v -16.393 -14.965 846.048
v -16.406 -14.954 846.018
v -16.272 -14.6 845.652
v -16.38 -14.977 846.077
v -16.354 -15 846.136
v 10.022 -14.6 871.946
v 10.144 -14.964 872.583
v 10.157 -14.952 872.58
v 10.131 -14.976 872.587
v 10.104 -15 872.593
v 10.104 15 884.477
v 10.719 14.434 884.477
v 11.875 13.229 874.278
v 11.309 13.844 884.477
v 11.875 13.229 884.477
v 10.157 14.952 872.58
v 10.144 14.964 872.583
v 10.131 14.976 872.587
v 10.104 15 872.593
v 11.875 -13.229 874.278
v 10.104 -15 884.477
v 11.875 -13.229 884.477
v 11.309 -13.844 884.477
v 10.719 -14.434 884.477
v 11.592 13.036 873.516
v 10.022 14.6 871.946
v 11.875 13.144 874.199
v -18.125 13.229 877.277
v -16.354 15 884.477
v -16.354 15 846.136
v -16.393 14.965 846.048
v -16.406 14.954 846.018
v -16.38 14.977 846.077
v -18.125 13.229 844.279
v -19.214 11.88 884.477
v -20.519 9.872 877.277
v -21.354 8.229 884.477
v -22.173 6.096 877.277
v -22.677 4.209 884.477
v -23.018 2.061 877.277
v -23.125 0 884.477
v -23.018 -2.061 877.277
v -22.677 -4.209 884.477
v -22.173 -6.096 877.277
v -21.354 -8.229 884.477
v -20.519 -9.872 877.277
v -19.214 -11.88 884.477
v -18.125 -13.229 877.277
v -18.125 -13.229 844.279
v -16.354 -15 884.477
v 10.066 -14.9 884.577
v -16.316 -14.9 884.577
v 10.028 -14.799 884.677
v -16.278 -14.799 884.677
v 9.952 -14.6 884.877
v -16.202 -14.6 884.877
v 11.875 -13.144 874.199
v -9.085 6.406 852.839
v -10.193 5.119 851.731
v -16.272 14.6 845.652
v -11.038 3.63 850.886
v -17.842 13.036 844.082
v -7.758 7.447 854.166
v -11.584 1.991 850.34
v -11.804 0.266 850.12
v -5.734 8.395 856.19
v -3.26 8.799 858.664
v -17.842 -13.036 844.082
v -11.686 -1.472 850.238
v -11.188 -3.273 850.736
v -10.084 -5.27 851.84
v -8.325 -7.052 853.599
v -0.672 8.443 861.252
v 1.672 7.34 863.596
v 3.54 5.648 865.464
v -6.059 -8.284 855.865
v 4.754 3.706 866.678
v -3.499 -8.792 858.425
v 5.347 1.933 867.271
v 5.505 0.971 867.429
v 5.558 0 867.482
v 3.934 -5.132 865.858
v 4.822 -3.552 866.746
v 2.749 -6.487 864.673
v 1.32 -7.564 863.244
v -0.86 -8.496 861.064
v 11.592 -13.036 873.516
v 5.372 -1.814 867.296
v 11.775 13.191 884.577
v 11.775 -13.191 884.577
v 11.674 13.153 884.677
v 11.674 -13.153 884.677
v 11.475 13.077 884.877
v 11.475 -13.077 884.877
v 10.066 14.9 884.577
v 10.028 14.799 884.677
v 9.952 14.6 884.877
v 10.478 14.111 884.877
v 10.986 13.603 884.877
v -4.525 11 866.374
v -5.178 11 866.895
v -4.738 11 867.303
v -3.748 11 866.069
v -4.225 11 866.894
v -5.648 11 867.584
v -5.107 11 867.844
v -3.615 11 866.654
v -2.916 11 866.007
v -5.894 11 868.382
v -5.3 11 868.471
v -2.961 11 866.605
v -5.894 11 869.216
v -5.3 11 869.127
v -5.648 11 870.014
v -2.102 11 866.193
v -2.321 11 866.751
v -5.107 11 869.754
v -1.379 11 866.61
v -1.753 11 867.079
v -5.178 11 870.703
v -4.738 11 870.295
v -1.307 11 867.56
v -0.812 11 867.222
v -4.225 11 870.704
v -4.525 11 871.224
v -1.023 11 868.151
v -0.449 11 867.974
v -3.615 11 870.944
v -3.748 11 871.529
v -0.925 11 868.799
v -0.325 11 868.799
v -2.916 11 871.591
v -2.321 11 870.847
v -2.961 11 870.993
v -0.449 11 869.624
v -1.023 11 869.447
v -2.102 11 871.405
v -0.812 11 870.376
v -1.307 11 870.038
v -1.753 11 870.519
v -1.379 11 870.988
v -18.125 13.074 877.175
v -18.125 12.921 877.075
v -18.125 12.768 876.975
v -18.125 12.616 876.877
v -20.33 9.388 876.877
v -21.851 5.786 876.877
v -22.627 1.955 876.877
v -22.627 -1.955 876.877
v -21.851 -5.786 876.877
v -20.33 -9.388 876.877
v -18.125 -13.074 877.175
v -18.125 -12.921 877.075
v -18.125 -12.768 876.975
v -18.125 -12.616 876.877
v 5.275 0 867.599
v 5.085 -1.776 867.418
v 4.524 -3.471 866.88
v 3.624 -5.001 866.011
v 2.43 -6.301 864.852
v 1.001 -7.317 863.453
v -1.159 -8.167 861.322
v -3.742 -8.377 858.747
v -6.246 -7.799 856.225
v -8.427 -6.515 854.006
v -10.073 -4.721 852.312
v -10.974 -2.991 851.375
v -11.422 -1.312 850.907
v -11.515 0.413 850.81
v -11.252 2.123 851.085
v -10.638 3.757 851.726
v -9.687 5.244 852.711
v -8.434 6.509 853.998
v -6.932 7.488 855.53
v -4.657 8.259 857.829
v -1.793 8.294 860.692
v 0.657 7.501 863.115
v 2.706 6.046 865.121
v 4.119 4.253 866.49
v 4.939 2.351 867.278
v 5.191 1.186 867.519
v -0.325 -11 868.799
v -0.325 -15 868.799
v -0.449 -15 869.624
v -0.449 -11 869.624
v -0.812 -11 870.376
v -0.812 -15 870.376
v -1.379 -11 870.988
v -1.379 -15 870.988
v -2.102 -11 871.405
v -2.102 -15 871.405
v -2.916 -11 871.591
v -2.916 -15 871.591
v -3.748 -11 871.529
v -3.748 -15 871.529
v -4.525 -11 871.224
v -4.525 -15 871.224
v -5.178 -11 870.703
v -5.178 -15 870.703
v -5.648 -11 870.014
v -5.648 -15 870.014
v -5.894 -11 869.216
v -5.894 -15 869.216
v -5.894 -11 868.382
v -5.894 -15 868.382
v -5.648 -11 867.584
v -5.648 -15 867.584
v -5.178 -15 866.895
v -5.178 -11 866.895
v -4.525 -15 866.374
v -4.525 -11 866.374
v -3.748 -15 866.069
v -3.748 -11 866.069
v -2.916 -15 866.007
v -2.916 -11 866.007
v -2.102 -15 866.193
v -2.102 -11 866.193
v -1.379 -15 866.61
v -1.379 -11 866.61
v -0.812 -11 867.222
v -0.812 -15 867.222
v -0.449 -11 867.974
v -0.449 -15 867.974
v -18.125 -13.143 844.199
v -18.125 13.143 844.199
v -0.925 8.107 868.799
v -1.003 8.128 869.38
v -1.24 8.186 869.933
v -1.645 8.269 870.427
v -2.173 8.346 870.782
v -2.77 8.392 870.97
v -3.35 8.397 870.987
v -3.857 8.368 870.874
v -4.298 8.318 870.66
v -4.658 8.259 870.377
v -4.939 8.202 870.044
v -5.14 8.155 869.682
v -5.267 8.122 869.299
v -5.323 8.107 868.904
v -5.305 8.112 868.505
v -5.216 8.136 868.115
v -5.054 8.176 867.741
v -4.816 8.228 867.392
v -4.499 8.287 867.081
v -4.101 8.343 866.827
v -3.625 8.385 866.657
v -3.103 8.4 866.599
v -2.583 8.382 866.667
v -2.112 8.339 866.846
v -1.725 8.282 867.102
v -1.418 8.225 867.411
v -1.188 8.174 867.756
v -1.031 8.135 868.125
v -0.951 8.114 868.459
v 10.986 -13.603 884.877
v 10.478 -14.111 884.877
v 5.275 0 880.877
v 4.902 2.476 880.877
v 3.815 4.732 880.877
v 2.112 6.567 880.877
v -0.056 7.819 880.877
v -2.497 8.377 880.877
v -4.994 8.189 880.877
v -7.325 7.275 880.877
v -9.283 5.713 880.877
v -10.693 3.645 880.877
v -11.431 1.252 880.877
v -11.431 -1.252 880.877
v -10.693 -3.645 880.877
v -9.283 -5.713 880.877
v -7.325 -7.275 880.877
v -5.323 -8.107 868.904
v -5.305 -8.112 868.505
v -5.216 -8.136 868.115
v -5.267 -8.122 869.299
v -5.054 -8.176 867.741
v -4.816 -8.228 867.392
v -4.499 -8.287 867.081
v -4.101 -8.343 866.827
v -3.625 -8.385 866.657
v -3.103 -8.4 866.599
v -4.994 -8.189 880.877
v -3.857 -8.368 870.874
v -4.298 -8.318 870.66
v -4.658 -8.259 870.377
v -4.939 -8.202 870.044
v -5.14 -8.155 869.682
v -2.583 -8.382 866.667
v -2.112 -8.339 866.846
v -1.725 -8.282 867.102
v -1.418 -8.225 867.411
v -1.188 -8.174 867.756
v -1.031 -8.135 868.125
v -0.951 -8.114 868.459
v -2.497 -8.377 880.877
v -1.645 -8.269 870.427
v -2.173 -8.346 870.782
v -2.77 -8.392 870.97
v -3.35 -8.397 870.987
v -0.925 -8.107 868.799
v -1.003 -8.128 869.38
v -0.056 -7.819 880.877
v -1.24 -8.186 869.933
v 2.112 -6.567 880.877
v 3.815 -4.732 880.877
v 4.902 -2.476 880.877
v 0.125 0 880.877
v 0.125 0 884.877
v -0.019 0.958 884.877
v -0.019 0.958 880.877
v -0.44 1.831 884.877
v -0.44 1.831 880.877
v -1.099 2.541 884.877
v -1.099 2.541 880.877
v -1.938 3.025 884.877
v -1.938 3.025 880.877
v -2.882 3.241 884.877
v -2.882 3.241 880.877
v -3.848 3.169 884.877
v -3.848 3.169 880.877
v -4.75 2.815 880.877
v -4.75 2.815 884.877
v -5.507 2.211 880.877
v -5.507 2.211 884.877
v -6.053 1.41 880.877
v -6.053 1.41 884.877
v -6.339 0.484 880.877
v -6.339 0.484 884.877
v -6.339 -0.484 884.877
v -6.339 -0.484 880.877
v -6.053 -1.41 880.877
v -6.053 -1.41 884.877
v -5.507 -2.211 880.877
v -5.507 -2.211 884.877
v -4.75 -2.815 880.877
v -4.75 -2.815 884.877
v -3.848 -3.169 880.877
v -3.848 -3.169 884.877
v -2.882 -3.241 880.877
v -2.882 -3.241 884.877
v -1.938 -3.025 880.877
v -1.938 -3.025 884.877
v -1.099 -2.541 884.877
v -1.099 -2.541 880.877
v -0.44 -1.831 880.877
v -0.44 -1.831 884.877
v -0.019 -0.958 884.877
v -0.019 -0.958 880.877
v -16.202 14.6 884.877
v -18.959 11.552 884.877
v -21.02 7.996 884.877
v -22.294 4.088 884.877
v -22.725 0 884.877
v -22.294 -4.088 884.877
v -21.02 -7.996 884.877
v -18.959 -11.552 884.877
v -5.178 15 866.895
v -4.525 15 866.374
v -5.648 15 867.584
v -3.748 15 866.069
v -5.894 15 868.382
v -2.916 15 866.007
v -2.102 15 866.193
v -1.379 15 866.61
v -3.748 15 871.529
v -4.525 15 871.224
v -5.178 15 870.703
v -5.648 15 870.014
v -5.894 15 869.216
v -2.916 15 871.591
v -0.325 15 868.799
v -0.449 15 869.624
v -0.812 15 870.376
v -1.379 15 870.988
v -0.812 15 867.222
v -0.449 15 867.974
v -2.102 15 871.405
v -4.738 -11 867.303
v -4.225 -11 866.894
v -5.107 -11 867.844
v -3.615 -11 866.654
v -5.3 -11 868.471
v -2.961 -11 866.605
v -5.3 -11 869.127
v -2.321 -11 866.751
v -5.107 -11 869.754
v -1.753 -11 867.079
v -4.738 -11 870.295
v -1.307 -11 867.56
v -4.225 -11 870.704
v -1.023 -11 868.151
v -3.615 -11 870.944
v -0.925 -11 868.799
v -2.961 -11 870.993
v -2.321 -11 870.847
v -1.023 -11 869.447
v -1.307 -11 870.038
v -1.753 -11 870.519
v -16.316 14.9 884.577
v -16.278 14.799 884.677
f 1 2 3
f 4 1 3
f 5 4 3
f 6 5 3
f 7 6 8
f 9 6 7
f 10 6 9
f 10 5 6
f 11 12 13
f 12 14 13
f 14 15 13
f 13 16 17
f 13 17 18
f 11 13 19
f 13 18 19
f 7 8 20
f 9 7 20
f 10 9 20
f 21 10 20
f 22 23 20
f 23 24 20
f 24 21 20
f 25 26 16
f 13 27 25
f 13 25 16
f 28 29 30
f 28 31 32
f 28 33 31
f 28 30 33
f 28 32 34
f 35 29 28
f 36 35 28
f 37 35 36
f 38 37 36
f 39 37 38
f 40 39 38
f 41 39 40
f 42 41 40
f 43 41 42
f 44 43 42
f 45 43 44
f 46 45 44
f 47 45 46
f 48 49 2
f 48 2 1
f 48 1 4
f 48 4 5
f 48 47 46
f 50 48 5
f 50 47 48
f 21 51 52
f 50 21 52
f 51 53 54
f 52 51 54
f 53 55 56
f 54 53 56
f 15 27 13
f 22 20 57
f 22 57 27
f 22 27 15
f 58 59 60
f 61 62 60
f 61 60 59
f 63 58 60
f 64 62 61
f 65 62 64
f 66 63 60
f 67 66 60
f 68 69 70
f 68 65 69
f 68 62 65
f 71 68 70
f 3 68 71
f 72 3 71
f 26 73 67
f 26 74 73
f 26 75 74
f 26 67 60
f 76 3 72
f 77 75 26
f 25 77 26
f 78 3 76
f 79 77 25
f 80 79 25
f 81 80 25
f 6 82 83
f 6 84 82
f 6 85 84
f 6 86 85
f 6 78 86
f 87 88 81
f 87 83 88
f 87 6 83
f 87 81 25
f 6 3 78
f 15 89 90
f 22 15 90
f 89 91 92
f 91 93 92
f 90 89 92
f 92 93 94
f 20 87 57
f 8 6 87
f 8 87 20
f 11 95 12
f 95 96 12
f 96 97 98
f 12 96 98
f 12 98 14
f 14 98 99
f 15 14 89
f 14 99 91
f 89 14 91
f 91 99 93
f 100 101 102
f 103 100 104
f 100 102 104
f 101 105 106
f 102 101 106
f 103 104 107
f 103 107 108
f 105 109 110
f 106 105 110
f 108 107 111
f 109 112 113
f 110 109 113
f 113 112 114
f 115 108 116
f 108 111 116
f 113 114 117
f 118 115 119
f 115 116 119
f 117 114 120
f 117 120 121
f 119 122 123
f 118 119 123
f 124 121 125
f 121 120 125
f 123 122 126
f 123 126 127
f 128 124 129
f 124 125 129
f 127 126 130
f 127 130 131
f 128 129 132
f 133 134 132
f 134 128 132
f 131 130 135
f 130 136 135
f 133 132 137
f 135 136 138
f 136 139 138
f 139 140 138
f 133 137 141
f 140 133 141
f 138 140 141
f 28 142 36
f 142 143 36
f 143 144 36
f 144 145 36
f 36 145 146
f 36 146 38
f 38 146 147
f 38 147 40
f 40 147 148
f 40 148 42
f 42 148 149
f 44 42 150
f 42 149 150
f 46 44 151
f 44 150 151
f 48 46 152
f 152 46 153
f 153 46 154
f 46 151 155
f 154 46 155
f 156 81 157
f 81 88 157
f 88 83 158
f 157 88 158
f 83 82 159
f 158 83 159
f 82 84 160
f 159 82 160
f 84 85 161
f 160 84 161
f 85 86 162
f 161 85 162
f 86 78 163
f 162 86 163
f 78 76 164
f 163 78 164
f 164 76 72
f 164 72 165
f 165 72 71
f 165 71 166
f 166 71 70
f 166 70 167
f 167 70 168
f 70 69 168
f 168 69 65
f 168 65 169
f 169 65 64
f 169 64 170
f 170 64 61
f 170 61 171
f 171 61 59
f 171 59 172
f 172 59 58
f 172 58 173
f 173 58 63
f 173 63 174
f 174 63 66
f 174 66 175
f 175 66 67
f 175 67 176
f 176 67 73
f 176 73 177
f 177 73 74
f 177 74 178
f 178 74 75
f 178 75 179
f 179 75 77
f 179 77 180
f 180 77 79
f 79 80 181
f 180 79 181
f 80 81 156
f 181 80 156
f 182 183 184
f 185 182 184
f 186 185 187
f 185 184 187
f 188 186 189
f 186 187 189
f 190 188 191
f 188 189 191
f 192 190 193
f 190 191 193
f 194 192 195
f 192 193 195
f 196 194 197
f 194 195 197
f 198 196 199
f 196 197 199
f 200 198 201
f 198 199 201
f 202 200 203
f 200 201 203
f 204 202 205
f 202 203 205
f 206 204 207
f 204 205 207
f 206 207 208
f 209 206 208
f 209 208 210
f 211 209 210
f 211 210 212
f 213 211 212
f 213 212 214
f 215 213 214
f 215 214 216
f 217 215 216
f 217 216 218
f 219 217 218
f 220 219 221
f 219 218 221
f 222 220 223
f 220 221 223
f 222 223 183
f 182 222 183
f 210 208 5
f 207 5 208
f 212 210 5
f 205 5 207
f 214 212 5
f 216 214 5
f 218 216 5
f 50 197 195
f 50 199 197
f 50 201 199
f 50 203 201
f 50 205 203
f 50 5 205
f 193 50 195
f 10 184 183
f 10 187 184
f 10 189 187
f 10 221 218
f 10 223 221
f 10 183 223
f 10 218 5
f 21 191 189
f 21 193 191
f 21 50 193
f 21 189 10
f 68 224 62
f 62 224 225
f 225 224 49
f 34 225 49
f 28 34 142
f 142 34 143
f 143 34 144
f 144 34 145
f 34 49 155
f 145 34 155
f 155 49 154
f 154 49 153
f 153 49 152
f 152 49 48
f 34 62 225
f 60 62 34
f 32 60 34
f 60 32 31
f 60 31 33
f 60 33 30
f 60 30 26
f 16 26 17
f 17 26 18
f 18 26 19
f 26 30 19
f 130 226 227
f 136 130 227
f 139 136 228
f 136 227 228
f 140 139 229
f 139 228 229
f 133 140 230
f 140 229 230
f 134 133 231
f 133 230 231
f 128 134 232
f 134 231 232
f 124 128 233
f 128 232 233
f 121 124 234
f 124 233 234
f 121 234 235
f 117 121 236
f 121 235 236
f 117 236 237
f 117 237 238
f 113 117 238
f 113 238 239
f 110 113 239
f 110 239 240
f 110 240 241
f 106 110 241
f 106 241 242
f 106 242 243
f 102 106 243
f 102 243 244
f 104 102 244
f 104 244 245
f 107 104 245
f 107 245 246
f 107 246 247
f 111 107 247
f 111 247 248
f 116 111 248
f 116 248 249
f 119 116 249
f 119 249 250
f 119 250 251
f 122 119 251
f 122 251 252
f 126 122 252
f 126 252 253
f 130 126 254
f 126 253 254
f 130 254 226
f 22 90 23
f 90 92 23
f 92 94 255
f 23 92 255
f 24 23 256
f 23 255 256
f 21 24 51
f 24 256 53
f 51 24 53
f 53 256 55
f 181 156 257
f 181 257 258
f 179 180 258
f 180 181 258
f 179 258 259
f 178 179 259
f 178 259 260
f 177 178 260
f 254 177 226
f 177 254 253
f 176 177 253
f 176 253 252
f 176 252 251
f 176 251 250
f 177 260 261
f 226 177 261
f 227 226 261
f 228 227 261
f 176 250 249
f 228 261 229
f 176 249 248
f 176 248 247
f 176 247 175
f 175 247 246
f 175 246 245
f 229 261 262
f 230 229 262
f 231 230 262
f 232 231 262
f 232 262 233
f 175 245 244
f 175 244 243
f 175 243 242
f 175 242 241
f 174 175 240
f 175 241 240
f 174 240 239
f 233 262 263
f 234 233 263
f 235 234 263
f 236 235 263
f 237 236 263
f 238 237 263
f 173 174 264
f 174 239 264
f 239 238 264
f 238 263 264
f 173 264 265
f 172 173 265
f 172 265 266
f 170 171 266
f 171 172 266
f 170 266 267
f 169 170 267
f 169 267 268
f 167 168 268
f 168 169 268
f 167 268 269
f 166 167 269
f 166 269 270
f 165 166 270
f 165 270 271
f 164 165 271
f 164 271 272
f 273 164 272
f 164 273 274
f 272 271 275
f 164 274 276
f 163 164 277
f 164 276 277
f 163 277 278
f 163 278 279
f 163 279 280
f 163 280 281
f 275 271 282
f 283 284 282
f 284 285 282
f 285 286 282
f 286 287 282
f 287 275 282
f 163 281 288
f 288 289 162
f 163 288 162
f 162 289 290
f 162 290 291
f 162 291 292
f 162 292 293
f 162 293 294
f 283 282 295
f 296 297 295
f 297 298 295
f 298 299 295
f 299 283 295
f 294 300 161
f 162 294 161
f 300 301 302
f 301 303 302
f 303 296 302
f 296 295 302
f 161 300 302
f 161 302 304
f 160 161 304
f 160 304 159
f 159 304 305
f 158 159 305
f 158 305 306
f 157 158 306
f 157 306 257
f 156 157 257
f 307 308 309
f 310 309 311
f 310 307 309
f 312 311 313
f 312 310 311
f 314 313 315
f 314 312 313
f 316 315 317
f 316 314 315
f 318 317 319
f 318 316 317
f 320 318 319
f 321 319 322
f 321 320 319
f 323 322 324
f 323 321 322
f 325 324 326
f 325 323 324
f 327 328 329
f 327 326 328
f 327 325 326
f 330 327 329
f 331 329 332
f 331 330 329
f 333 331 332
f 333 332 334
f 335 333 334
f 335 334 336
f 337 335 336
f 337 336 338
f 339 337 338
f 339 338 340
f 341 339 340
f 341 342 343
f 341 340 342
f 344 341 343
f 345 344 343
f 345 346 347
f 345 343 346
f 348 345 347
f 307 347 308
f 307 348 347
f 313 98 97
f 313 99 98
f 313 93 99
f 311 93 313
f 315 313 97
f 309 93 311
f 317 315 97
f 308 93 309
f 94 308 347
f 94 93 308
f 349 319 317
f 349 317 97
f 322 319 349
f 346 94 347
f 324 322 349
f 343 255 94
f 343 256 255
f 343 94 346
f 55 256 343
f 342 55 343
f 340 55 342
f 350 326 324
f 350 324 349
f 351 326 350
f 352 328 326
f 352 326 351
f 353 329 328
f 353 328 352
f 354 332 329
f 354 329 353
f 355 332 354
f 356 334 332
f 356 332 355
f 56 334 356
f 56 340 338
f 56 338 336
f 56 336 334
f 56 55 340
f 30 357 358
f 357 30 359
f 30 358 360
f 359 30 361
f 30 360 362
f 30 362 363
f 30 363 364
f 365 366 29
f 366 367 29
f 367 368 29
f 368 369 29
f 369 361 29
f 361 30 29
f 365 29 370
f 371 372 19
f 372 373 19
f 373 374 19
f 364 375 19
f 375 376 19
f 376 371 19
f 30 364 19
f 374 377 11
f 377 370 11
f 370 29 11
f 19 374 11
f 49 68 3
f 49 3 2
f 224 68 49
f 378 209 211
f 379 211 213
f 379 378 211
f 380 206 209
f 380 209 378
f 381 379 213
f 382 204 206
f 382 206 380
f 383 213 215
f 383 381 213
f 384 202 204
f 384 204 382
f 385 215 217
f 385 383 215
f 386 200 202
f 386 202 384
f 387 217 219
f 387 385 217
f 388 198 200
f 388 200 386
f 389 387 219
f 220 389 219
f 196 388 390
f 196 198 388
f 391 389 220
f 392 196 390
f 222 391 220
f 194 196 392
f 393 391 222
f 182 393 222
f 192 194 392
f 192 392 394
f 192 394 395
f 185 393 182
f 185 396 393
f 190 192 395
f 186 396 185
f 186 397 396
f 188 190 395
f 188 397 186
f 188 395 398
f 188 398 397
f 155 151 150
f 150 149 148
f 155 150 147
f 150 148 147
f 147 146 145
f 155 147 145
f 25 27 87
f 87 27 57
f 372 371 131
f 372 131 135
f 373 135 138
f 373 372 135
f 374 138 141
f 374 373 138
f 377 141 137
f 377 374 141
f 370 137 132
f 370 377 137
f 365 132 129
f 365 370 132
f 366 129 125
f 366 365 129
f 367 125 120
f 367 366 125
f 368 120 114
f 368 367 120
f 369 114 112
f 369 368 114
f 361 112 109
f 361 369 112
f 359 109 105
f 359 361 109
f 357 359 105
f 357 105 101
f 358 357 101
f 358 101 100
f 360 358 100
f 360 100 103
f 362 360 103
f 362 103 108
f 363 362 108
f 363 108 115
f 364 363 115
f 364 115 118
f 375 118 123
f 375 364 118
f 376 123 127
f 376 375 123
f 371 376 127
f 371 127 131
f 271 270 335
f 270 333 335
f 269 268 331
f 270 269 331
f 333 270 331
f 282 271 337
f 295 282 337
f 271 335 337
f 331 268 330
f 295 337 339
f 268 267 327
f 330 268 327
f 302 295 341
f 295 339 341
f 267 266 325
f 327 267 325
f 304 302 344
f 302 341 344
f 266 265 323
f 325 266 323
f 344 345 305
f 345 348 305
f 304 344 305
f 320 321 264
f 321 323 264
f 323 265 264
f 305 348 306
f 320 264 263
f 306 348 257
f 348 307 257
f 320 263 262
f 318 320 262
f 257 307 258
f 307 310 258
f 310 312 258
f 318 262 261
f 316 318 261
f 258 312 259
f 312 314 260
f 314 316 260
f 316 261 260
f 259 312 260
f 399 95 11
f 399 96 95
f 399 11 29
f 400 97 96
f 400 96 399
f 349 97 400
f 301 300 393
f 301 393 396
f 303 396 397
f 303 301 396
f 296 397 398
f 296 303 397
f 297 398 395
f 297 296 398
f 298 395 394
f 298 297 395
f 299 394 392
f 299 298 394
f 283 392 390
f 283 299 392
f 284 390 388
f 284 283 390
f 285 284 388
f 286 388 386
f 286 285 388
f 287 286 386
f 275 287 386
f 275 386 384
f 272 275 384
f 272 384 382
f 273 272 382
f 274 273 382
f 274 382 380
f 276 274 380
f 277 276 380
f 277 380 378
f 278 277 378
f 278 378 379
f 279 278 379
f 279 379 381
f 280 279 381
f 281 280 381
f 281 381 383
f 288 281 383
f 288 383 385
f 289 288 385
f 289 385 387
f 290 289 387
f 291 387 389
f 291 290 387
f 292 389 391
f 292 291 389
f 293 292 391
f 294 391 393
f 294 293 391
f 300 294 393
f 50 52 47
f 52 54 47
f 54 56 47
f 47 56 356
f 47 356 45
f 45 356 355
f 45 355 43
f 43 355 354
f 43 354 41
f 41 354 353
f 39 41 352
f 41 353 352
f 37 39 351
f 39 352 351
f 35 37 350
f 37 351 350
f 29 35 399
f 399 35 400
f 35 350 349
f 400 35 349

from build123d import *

# Parameters (mm, degrees)
PAD045_DEPTH         = 15
SKETCH178_R          = 8.4
POCKET110_DEPTH      = 40.078905
SKETCH180_R          = 3.25
POCKET111_DEPTH      = 4.001
SKETCH181_R          = 62.5
SKETCH181_R_2        = 20
POCKET112_DEPTH      = 14.001
POCKET112_DEPTH_BACK = 30.078905
SKETCH183_R          = 2.2
POCKET114_DEPTH      = 15.001
POCKET114_DEPTH_BACK = 15.001
SKETCH184_W          = 6
SKETCH184_H          = 53.327905
POCKET193_DEPTH      = 15.001
POCKET193_DEPTH_BACK = 15.001
SKETCH286_R          = 2.8
POCKET194_DEPTH      = 4
CHAMFER004_SIZE      = 0.4


with BuildPart() as part:
    # Sketch177 → Pad045 (new body, symmetric)
    with BuildSketch(Plane.XZ):
        Polygon((-18, -14), (15, 19), (15, 30.077905), (-20, 30.077905), (-20, -14), align=None)
    extrude(amount=PAD045_DEPTH, both=True)

    # Sketch178 (on DatumPlane) → Pocket110 (cut, through all)
    with BuildSketch(Plane.XY.offset(26.077905)):
        Circle(SKETCH178_R)
    extrude(amount=-POCKET110_DEPTH, mode=Mode.SUBTRACT)

    # Sketch180 (on DatumPlane) → Pocket111 (cut, through all)
    with BuildSketch(Plane.XY.offset(26.077905)):
        Circle(SKETCH180_R)
    extrude(amount=POCKET111_DEPTH, mode=Mode.SUBTRACT)

    # Sketch181 → Pocket112 (cut, two sides)
    with BuildSketch(Plane.XY) as pocket112_sk:
        Circle(SKETCH181_R)
        Circle(SKETCH181_R_2, mode=Mode.SUBTRACT)
    extrude(amount=-POCKET112_DEPTH, mode=Mode.SUBTRACT)
    extrude(pocket112_sk.sketch, amount=POCKET112_DEPTH_BACK, mode=Mode.SUBTRACT)

    # Sketch183 → Pocket114 (cut, two sides)
    with BuildSketch(Plane.XZ) as pocket114_sk:
        with Locations((0, 14)):
            Circle(SKETCH183_R)
    extrude(amount=-POCKET114_DEPTH, mode=Mode.SUBTRACT)
    extrude(pocket114_sk.sketch, amount=POCKET114_DEPTH_BACK, mode=Mode.SUBTRACT)

    # Sketch184 → Pocket193 (cut, two sides)
    with BuildSketch(Plane.XZ) as pocket193_sk:
        with Locations((-18, -4.586048)):
            Rectangle(SKETCH184_W, SKETCH184_H)
    extrude(amount=-POCKET193_DEPTH, mode=Mode.SUBTRACT)
    extrude(pocket193_sk.sketch, amount=POCKET193_DEPTH_BACK, mode=Mode.SUBTRACT)

    # Sketch286 (on Face7 of Pad045) → Pocket194 (cut)
    with BuildSketch(Plane.XZ.offset(15)):
        with Locations((0, 14)):
            Circle(SKETCH286_R)
    pocket194 = extrude(amount=-POCKET194_DEPTH, mode=Mode.SUBTRACT)

    # Mirrored010: Pocket194 across XZ
    add(pocket194.mirror(Plane.XZ), mode=Mode.SUBTRACT)

    # Chamfer004
    chamfer004_edges = [part.edges().sort_by_distance(p)[0] for p in [
        (-18.228757, 8.228757, 30.077905),
        (-18.228757, -8.228757, 30.077905),
        (0, 15, 30.077905),
        (14.142136, 14.142136, 30.077905),
        (15, 0, 30.077905),
        (14.142136, -14.142136, 30.077905),
        (0, -15, 30.077905),
        (15, 0, 19),
        (14.132889, 14.151376, 18.132889),
        (0, 15, 4),
        (14.132889, -14.151376, 18.132889),
        (0, -15, 4),
        (-8.399998, -0.005359, -4.399998),
        (-14.132889, 14.151376, -10.132889),
        (-15, 0, -11),
        (-14.132889, -14.151376, -10.132889),
        (-18.708287, -7.071068, 22.077905),
        (-18.708287, 7.071068, 22.077905),
    ]]
    chamfer(chamfer004_edges, length=CHAMFER004_SIZE)


with BuildPart() as part_1:
    # Body022036 placement: moved
    add(part.part.moved(Location((-3.125, 0, 854.79899))))


solid = part_1.part
